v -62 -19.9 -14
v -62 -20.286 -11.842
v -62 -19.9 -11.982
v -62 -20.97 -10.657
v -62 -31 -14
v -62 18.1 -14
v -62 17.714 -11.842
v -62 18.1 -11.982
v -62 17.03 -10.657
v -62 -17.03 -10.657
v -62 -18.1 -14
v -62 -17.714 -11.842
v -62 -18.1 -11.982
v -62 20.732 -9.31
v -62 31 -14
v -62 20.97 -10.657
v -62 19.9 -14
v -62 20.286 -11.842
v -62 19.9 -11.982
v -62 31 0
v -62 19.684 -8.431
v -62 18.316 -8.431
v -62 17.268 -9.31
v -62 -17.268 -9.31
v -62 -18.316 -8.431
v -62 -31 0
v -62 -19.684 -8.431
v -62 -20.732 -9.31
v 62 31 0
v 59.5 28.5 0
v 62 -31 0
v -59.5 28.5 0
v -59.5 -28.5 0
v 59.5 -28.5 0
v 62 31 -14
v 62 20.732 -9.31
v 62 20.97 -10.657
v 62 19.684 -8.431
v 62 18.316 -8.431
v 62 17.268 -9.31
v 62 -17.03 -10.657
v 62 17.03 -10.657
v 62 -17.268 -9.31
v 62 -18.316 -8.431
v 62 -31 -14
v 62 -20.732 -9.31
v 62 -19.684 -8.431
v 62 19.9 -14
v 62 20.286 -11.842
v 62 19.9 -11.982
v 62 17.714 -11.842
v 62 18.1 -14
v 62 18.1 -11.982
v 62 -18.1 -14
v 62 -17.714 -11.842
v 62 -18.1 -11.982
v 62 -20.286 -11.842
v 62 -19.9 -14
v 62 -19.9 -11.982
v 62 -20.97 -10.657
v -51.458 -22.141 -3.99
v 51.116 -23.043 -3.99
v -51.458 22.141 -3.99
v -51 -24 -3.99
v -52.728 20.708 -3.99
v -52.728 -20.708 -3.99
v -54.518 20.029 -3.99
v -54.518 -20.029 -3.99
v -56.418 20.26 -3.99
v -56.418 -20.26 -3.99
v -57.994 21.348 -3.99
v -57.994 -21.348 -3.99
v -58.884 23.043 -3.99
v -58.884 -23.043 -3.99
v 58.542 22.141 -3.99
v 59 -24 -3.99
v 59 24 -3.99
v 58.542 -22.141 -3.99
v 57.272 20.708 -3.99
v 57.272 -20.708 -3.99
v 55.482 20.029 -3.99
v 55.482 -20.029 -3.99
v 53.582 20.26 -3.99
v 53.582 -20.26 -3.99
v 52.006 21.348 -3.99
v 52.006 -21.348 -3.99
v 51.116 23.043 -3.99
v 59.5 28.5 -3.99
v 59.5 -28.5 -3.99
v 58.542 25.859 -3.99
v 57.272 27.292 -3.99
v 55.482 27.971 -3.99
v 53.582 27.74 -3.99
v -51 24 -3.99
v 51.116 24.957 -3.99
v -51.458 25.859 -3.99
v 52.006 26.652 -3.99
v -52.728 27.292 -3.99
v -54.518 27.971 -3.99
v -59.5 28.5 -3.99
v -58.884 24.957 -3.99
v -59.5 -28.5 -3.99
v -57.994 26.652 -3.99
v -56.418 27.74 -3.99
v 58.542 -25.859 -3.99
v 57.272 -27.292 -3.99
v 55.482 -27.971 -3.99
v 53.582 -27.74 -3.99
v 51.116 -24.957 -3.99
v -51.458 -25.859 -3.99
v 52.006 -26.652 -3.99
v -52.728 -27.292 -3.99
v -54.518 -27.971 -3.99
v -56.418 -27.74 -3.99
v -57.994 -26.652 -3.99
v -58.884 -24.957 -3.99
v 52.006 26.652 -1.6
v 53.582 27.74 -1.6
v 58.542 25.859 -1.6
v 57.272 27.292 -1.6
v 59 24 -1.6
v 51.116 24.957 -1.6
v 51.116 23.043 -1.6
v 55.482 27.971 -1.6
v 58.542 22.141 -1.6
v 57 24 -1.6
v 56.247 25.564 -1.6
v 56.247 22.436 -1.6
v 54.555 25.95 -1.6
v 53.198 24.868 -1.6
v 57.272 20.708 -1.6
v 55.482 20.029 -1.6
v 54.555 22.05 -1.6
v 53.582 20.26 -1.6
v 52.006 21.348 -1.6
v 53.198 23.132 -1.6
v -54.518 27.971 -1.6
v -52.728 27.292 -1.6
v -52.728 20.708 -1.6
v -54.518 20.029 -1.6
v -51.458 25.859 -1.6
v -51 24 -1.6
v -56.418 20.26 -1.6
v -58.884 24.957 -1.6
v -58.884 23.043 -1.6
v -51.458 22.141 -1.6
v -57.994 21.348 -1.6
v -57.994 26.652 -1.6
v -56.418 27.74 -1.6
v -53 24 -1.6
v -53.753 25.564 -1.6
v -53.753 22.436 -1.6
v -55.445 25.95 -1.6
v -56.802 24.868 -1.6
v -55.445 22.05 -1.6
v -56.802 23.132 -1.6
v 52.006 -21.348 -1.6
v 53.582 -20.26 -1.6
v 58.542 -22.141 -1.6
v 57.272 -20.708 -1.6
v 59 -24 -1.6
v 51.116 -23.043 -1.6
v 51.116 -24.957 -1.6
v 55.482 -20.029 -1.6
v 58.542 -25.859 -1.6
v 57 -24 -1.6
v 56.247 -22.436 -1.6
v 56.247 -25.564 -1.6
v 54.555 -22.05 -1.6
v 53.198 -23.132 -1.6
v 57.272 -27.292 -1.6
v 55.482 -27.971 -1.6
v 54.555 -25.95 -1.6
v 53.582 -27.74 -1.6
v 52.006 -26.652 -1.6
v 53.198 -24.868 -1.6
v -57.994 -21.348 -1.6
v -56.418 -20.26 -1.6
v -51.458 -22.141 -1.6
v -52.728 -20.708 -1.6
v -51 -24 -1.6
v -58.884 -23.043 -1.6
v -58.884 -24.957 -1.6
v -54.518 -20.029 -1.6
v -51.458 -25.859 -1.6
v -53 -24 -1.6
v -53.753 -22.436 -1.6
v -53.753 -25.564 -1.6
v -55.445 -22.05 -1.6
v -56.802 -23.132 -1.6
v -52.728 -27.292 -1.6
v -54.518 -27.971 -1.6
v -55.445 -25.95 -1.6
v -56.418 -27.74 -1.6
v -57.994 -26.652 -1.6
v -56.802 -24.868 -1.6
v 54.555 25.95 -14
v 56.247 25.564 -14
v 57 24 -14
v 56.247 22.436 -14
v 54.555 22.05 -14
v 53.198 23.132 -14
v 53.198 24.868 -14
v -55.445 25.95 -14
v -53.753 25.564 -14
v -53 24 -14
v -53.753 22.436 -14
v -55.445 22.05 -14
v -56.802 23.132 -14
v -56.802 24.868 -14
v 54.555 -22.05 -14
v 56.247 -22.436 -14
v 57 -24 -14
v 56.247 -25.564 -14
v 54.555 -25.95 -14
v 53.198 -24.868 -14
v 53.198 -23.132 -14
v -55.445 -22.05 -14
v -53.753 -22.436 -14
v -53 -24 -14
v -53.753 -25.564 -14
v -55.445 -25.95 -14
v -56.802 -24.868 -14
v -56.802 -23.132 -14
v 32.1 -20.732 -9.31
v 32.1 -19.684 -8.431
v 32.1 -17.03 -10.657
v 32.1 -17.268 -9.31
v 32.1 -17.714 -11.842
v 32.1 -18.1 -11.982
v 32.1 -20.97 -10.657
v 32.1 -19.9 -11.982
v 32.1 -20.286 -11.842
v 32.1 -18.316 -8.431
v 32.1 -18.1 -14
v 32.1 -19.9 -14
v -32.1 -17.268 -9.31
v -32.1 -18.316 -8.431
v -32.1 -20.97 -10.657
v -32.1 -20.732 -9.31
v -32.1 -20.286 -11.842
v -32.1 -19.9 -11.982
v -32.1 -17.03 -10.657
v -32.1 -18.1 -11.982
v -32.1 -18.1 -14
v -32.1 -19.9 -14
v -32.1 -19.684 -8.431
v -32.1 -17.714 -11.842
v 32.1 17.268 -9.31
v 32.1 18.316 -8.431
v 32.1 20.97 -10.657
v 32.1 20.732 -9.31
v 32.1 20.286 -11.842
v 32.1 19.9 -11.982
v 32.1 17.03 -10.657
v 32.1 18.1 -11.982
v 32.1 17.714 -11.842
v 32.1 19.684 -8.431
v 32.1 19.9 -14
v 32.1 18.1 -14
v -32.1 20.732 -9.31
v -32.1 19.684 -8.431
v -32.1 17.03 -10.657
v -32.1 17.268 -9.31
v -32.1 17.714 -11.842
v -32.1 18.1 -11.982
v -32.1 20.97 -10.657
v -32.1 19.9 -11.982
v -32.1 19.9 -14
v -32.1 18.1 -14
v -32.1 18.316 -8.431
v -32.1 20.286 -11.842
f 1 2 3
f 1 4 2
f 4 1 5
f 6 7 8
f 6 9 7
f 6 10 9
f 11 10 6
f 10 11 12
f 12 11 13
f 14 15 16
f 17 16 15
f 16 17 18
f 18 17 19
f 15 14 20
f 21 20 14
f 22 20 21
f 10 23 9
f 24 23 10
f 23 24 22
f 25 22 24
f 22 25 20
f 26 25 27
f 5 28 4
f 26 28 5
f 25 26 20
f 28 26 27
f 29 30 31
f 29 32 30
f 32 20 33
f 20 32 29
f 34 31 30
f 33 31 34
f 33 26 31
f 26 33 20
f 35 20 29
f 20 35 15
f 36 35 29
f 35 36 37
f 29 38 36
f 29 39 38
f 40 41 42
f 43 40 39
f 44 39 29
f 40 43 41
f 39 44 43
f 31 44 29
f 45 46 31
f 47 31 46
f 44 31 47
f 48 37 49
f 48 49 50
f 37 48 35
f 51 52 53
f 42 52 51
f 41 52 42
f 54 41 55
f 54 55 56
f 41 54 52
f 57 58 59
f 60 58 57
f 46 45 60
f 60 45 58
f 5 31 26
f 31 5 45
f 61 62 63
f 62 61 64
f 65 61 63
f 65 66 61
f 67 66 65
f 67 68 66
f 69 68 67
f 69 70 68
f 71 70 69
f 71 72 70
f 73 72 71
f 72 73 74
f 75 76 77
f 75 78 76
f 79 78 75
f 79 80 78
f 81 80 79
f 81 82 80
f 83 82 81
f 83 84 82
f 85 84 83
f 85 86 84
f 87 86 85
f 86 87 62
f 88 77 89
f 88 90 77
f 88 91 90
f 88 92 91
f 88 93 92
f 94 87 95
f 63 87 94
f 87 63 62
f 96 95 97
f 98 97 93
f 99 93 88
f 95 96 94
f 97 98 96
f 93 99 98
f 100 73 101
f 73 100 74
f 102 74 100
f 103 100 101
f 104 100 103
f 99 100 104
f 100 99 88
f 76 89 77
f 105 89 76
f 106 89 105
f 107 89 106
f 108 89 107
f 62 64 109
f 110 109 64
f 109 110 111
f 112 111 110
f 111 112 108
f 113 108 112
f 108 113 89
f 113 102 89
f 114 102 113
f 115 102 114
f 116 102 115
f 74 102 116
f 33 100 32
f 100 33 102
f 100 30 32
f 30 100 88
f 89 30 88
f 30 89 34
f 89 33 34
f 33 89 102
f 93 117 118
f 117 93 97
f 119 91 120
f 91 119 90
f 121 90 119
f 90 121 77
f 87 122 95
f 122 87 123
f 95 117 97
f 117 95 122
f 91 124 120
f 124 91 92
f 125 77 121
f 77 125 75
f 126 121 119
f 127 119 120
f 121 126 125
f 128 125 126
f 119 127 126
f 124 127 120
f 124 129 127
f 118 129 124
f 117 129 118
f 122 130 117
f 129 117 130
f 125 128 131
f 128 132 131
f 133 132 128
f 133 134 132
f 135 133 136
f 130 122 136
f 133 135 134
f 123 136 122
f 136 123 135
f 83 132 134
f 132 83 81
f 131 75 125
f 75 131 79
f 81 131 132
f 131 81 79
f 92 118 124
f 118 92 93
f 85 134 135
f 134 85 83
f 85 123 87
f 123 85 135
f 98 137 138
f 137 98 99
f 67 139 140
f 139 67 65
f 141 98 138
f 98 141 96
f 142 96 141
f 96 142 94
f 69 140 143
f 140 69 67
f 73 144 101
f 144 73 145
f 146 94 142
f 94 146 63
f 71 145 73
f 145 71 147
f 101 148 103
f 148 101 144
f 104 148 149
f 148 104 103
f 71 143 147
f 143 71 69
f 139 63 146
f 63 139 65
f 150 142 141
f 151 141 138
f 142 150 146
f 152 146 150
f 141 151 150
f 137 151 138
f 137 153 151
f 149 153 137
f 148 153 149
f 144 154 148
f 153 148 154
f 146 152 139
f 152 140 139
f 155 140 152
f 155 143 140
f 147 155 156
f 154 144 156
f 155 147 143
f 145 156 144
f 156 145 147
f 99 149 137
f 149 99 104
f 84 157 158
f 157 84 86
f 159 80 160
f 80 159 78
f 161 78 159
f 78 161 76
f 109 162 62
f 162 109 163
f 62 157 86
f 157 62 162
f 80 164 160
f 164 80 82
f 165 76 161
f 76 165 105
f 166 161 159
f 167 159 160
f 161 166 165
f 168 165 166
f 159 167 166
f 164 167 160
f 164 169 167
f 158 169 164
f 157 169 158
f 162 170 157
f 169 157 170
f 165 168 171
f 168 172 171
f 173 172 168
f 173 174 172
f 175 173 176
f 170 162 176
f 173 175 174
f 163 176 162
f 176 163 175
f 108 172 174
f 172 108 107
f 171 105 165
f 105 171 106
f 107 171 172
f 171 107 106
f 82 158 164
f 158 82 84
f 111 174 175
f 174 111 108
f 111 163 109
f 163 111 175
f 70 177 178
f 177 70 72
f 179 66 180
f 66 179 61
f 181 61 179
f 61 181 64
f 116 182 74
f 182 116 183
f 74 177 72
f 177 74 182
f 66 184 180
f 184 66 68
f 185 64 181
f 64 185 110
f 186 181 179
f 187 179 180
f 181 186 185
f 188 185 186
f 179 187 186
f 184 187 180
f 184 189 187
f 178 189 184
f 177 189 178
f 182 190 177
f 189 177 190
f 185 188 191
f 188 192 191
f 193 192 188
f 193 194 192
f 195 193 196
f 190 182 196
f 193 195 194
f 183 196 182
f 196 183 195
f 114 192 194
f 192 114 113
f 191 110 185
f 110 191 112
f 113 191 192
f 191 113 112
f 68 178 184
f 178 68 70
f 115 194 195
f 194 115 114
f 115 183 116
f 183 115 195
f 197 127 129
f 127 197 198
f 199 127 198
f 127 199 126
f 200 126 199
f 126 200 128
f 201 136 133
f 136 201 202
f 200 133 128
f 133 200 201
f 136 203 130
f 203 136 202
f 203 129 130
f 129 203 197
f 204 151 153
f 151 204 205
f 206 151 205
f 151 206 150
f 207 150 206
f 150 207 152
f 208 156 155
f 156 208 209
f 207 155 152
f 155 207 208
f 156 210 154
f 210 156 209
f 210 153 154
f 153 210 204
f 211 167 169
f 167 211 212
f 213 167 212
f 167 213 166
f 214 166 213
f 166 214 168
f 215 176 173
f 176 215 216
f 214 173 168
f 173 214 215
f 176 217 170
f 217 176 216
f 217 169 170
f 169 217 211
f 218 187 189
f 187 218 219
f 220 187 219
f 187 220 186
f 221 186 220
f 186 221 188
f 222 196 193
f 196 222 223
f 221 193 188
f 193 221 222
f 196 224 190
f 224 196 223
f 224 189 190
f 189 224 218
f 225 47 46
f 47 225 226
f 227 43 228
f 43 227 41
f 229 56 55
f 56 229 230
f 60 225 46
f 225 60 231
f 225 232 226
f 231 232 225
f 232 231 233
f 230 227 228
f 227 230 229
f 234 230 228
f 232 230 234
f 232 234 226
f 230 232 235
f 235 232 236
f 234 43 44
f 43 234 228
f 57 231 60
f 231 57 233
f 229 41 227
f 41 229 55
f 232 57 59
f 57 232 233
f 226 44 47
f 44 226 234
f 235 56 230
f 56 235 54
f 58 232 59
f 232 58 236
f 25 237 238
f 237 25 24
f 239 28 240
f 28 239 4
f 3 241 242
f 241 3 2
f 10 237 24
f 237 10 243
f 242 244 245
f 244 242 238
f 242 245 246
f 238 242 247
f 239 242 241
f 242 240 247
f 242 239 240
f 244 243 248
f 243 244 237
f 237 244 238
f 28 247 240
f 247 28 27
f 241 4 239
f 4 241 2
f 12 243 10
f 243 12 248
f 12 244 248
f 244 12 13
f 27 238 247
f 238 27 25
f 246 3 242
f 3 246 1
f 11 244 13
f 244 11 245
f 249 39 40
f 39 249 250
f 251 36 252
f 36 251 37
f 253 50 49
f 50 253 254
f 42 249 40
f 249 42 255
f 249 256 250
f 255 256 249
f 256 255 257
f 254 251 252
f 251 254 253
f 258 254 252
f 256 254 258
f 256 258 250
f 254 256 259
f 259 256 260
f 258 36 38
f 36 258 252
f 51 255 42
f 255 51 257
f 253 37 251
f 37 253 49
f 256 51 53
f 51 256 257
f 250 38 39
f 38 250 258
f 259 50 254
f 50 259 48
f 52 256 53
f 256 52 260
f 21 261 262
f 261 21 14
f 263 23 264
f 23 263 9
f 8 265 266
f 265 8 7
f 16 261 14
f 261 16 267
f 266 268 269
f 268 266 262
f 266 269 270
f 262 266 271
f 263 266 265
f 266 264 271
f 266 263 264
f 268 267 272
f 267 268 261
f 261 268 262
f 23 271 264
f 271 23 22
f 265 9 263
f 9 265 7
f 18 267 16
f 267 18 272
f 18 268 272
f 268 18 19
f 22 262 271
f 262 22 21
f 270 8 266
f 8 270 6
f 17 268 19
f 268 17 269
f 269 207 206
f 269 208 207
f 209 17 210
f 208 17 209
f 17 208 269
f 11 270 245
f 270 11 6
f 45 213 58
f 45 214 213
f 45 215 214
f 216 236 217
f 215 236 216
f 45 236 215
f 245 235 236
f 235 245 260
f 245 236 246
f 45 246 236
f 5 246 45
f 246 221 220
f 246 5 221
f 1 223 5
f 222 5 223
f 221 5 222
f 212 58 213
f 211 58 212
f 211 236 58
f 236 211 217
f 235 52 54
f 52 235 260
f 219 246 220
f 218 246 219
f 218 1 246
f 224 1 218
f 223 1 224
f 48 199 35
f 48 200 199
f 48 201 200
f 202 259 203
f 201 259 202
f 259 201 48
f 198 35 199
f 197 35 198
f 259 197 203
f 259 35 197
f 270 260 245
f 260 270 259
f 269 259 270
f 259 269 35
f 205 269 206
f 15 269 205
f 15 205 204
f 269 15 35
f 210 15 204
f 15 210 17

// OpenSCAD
board_size = [118, 56] + [1, 1];
mount_size = board_size + [5, 5];
height = 8;

pcb_thickness = 1.6;

screw_centres = [110, 48];
screw_positions = [
  [screw_centres[0] / 2, screw_centres[1] / 2],
  [-screw_centres[0] / 2, screw_centres[1] / 2],
  [screw_centres[0] / 2, -screw_centres[1] / 2],
  [-screw_centres[0] / 2, -screw_centres[1] / 2],
];

module Case() {
  tray_depth = 4;

  difference() {
    union() {
      difference() {
        translate([0, 0, -height]) {
          linear_extrude(height) {
            square(mount_size, center = true);
          }
        }

        translate([0, 0, 0.01 - tray_depth]) {
          linear_extrude(tray_depth) {
            square(board_size, center = true);
          }
        }
      }

      translate([0, 0, -tray_depth]) {
        for(p = screw_positions) {
          translate(p) {
            cylinder(d = 8, h = abs(tray_depth) - pcb_thickness);
          }
        }
      }
    }

    translate([0, 0, -height - 1]) {
      for(p = screw_positions) {
        translate(p) {
          cylinder(d = 4, h = height + 2);
        }
      }
    }
  }
}

module DinBracketMount() {
  h2 = 6;
  depth = 30;
  fw = 1.8;
  ho = 3.7;

  difference() {
    translate([0, 0, -height - h2]) {
      linear_extrude(h2) {
        square(mount_size, center = true);
      }
    }

    translate([0, 0, -height - h2 - 0.01]) {
      for(p = screw_positions) {
        translate(p) {
          cylinder(d = 4, h = h2 + 0.1);
        }
      }

      o = -(mount_size[1] / 2) + 12;
      for(y = [o, o + 38]) {
        translate([0, y, ho]) {
          for(a = [0, 180]) {
            rotate([0, 0, a]) {
              translate([(mount_size[0] / 2) - depth + 0.1, 0, 0]) {
                rotate([0, 90, 0])
                cylinder(d = 4, h = depth, $fn = 9);
              }
              translate([(mount_size[0] / 2) - depth + 0.1, -fw / 2, -ho]) {
                cube([depth, fw, ho]);
              }
            }
          }
        }
      }
    }
  }
}

Case();
DinBracketMount();
